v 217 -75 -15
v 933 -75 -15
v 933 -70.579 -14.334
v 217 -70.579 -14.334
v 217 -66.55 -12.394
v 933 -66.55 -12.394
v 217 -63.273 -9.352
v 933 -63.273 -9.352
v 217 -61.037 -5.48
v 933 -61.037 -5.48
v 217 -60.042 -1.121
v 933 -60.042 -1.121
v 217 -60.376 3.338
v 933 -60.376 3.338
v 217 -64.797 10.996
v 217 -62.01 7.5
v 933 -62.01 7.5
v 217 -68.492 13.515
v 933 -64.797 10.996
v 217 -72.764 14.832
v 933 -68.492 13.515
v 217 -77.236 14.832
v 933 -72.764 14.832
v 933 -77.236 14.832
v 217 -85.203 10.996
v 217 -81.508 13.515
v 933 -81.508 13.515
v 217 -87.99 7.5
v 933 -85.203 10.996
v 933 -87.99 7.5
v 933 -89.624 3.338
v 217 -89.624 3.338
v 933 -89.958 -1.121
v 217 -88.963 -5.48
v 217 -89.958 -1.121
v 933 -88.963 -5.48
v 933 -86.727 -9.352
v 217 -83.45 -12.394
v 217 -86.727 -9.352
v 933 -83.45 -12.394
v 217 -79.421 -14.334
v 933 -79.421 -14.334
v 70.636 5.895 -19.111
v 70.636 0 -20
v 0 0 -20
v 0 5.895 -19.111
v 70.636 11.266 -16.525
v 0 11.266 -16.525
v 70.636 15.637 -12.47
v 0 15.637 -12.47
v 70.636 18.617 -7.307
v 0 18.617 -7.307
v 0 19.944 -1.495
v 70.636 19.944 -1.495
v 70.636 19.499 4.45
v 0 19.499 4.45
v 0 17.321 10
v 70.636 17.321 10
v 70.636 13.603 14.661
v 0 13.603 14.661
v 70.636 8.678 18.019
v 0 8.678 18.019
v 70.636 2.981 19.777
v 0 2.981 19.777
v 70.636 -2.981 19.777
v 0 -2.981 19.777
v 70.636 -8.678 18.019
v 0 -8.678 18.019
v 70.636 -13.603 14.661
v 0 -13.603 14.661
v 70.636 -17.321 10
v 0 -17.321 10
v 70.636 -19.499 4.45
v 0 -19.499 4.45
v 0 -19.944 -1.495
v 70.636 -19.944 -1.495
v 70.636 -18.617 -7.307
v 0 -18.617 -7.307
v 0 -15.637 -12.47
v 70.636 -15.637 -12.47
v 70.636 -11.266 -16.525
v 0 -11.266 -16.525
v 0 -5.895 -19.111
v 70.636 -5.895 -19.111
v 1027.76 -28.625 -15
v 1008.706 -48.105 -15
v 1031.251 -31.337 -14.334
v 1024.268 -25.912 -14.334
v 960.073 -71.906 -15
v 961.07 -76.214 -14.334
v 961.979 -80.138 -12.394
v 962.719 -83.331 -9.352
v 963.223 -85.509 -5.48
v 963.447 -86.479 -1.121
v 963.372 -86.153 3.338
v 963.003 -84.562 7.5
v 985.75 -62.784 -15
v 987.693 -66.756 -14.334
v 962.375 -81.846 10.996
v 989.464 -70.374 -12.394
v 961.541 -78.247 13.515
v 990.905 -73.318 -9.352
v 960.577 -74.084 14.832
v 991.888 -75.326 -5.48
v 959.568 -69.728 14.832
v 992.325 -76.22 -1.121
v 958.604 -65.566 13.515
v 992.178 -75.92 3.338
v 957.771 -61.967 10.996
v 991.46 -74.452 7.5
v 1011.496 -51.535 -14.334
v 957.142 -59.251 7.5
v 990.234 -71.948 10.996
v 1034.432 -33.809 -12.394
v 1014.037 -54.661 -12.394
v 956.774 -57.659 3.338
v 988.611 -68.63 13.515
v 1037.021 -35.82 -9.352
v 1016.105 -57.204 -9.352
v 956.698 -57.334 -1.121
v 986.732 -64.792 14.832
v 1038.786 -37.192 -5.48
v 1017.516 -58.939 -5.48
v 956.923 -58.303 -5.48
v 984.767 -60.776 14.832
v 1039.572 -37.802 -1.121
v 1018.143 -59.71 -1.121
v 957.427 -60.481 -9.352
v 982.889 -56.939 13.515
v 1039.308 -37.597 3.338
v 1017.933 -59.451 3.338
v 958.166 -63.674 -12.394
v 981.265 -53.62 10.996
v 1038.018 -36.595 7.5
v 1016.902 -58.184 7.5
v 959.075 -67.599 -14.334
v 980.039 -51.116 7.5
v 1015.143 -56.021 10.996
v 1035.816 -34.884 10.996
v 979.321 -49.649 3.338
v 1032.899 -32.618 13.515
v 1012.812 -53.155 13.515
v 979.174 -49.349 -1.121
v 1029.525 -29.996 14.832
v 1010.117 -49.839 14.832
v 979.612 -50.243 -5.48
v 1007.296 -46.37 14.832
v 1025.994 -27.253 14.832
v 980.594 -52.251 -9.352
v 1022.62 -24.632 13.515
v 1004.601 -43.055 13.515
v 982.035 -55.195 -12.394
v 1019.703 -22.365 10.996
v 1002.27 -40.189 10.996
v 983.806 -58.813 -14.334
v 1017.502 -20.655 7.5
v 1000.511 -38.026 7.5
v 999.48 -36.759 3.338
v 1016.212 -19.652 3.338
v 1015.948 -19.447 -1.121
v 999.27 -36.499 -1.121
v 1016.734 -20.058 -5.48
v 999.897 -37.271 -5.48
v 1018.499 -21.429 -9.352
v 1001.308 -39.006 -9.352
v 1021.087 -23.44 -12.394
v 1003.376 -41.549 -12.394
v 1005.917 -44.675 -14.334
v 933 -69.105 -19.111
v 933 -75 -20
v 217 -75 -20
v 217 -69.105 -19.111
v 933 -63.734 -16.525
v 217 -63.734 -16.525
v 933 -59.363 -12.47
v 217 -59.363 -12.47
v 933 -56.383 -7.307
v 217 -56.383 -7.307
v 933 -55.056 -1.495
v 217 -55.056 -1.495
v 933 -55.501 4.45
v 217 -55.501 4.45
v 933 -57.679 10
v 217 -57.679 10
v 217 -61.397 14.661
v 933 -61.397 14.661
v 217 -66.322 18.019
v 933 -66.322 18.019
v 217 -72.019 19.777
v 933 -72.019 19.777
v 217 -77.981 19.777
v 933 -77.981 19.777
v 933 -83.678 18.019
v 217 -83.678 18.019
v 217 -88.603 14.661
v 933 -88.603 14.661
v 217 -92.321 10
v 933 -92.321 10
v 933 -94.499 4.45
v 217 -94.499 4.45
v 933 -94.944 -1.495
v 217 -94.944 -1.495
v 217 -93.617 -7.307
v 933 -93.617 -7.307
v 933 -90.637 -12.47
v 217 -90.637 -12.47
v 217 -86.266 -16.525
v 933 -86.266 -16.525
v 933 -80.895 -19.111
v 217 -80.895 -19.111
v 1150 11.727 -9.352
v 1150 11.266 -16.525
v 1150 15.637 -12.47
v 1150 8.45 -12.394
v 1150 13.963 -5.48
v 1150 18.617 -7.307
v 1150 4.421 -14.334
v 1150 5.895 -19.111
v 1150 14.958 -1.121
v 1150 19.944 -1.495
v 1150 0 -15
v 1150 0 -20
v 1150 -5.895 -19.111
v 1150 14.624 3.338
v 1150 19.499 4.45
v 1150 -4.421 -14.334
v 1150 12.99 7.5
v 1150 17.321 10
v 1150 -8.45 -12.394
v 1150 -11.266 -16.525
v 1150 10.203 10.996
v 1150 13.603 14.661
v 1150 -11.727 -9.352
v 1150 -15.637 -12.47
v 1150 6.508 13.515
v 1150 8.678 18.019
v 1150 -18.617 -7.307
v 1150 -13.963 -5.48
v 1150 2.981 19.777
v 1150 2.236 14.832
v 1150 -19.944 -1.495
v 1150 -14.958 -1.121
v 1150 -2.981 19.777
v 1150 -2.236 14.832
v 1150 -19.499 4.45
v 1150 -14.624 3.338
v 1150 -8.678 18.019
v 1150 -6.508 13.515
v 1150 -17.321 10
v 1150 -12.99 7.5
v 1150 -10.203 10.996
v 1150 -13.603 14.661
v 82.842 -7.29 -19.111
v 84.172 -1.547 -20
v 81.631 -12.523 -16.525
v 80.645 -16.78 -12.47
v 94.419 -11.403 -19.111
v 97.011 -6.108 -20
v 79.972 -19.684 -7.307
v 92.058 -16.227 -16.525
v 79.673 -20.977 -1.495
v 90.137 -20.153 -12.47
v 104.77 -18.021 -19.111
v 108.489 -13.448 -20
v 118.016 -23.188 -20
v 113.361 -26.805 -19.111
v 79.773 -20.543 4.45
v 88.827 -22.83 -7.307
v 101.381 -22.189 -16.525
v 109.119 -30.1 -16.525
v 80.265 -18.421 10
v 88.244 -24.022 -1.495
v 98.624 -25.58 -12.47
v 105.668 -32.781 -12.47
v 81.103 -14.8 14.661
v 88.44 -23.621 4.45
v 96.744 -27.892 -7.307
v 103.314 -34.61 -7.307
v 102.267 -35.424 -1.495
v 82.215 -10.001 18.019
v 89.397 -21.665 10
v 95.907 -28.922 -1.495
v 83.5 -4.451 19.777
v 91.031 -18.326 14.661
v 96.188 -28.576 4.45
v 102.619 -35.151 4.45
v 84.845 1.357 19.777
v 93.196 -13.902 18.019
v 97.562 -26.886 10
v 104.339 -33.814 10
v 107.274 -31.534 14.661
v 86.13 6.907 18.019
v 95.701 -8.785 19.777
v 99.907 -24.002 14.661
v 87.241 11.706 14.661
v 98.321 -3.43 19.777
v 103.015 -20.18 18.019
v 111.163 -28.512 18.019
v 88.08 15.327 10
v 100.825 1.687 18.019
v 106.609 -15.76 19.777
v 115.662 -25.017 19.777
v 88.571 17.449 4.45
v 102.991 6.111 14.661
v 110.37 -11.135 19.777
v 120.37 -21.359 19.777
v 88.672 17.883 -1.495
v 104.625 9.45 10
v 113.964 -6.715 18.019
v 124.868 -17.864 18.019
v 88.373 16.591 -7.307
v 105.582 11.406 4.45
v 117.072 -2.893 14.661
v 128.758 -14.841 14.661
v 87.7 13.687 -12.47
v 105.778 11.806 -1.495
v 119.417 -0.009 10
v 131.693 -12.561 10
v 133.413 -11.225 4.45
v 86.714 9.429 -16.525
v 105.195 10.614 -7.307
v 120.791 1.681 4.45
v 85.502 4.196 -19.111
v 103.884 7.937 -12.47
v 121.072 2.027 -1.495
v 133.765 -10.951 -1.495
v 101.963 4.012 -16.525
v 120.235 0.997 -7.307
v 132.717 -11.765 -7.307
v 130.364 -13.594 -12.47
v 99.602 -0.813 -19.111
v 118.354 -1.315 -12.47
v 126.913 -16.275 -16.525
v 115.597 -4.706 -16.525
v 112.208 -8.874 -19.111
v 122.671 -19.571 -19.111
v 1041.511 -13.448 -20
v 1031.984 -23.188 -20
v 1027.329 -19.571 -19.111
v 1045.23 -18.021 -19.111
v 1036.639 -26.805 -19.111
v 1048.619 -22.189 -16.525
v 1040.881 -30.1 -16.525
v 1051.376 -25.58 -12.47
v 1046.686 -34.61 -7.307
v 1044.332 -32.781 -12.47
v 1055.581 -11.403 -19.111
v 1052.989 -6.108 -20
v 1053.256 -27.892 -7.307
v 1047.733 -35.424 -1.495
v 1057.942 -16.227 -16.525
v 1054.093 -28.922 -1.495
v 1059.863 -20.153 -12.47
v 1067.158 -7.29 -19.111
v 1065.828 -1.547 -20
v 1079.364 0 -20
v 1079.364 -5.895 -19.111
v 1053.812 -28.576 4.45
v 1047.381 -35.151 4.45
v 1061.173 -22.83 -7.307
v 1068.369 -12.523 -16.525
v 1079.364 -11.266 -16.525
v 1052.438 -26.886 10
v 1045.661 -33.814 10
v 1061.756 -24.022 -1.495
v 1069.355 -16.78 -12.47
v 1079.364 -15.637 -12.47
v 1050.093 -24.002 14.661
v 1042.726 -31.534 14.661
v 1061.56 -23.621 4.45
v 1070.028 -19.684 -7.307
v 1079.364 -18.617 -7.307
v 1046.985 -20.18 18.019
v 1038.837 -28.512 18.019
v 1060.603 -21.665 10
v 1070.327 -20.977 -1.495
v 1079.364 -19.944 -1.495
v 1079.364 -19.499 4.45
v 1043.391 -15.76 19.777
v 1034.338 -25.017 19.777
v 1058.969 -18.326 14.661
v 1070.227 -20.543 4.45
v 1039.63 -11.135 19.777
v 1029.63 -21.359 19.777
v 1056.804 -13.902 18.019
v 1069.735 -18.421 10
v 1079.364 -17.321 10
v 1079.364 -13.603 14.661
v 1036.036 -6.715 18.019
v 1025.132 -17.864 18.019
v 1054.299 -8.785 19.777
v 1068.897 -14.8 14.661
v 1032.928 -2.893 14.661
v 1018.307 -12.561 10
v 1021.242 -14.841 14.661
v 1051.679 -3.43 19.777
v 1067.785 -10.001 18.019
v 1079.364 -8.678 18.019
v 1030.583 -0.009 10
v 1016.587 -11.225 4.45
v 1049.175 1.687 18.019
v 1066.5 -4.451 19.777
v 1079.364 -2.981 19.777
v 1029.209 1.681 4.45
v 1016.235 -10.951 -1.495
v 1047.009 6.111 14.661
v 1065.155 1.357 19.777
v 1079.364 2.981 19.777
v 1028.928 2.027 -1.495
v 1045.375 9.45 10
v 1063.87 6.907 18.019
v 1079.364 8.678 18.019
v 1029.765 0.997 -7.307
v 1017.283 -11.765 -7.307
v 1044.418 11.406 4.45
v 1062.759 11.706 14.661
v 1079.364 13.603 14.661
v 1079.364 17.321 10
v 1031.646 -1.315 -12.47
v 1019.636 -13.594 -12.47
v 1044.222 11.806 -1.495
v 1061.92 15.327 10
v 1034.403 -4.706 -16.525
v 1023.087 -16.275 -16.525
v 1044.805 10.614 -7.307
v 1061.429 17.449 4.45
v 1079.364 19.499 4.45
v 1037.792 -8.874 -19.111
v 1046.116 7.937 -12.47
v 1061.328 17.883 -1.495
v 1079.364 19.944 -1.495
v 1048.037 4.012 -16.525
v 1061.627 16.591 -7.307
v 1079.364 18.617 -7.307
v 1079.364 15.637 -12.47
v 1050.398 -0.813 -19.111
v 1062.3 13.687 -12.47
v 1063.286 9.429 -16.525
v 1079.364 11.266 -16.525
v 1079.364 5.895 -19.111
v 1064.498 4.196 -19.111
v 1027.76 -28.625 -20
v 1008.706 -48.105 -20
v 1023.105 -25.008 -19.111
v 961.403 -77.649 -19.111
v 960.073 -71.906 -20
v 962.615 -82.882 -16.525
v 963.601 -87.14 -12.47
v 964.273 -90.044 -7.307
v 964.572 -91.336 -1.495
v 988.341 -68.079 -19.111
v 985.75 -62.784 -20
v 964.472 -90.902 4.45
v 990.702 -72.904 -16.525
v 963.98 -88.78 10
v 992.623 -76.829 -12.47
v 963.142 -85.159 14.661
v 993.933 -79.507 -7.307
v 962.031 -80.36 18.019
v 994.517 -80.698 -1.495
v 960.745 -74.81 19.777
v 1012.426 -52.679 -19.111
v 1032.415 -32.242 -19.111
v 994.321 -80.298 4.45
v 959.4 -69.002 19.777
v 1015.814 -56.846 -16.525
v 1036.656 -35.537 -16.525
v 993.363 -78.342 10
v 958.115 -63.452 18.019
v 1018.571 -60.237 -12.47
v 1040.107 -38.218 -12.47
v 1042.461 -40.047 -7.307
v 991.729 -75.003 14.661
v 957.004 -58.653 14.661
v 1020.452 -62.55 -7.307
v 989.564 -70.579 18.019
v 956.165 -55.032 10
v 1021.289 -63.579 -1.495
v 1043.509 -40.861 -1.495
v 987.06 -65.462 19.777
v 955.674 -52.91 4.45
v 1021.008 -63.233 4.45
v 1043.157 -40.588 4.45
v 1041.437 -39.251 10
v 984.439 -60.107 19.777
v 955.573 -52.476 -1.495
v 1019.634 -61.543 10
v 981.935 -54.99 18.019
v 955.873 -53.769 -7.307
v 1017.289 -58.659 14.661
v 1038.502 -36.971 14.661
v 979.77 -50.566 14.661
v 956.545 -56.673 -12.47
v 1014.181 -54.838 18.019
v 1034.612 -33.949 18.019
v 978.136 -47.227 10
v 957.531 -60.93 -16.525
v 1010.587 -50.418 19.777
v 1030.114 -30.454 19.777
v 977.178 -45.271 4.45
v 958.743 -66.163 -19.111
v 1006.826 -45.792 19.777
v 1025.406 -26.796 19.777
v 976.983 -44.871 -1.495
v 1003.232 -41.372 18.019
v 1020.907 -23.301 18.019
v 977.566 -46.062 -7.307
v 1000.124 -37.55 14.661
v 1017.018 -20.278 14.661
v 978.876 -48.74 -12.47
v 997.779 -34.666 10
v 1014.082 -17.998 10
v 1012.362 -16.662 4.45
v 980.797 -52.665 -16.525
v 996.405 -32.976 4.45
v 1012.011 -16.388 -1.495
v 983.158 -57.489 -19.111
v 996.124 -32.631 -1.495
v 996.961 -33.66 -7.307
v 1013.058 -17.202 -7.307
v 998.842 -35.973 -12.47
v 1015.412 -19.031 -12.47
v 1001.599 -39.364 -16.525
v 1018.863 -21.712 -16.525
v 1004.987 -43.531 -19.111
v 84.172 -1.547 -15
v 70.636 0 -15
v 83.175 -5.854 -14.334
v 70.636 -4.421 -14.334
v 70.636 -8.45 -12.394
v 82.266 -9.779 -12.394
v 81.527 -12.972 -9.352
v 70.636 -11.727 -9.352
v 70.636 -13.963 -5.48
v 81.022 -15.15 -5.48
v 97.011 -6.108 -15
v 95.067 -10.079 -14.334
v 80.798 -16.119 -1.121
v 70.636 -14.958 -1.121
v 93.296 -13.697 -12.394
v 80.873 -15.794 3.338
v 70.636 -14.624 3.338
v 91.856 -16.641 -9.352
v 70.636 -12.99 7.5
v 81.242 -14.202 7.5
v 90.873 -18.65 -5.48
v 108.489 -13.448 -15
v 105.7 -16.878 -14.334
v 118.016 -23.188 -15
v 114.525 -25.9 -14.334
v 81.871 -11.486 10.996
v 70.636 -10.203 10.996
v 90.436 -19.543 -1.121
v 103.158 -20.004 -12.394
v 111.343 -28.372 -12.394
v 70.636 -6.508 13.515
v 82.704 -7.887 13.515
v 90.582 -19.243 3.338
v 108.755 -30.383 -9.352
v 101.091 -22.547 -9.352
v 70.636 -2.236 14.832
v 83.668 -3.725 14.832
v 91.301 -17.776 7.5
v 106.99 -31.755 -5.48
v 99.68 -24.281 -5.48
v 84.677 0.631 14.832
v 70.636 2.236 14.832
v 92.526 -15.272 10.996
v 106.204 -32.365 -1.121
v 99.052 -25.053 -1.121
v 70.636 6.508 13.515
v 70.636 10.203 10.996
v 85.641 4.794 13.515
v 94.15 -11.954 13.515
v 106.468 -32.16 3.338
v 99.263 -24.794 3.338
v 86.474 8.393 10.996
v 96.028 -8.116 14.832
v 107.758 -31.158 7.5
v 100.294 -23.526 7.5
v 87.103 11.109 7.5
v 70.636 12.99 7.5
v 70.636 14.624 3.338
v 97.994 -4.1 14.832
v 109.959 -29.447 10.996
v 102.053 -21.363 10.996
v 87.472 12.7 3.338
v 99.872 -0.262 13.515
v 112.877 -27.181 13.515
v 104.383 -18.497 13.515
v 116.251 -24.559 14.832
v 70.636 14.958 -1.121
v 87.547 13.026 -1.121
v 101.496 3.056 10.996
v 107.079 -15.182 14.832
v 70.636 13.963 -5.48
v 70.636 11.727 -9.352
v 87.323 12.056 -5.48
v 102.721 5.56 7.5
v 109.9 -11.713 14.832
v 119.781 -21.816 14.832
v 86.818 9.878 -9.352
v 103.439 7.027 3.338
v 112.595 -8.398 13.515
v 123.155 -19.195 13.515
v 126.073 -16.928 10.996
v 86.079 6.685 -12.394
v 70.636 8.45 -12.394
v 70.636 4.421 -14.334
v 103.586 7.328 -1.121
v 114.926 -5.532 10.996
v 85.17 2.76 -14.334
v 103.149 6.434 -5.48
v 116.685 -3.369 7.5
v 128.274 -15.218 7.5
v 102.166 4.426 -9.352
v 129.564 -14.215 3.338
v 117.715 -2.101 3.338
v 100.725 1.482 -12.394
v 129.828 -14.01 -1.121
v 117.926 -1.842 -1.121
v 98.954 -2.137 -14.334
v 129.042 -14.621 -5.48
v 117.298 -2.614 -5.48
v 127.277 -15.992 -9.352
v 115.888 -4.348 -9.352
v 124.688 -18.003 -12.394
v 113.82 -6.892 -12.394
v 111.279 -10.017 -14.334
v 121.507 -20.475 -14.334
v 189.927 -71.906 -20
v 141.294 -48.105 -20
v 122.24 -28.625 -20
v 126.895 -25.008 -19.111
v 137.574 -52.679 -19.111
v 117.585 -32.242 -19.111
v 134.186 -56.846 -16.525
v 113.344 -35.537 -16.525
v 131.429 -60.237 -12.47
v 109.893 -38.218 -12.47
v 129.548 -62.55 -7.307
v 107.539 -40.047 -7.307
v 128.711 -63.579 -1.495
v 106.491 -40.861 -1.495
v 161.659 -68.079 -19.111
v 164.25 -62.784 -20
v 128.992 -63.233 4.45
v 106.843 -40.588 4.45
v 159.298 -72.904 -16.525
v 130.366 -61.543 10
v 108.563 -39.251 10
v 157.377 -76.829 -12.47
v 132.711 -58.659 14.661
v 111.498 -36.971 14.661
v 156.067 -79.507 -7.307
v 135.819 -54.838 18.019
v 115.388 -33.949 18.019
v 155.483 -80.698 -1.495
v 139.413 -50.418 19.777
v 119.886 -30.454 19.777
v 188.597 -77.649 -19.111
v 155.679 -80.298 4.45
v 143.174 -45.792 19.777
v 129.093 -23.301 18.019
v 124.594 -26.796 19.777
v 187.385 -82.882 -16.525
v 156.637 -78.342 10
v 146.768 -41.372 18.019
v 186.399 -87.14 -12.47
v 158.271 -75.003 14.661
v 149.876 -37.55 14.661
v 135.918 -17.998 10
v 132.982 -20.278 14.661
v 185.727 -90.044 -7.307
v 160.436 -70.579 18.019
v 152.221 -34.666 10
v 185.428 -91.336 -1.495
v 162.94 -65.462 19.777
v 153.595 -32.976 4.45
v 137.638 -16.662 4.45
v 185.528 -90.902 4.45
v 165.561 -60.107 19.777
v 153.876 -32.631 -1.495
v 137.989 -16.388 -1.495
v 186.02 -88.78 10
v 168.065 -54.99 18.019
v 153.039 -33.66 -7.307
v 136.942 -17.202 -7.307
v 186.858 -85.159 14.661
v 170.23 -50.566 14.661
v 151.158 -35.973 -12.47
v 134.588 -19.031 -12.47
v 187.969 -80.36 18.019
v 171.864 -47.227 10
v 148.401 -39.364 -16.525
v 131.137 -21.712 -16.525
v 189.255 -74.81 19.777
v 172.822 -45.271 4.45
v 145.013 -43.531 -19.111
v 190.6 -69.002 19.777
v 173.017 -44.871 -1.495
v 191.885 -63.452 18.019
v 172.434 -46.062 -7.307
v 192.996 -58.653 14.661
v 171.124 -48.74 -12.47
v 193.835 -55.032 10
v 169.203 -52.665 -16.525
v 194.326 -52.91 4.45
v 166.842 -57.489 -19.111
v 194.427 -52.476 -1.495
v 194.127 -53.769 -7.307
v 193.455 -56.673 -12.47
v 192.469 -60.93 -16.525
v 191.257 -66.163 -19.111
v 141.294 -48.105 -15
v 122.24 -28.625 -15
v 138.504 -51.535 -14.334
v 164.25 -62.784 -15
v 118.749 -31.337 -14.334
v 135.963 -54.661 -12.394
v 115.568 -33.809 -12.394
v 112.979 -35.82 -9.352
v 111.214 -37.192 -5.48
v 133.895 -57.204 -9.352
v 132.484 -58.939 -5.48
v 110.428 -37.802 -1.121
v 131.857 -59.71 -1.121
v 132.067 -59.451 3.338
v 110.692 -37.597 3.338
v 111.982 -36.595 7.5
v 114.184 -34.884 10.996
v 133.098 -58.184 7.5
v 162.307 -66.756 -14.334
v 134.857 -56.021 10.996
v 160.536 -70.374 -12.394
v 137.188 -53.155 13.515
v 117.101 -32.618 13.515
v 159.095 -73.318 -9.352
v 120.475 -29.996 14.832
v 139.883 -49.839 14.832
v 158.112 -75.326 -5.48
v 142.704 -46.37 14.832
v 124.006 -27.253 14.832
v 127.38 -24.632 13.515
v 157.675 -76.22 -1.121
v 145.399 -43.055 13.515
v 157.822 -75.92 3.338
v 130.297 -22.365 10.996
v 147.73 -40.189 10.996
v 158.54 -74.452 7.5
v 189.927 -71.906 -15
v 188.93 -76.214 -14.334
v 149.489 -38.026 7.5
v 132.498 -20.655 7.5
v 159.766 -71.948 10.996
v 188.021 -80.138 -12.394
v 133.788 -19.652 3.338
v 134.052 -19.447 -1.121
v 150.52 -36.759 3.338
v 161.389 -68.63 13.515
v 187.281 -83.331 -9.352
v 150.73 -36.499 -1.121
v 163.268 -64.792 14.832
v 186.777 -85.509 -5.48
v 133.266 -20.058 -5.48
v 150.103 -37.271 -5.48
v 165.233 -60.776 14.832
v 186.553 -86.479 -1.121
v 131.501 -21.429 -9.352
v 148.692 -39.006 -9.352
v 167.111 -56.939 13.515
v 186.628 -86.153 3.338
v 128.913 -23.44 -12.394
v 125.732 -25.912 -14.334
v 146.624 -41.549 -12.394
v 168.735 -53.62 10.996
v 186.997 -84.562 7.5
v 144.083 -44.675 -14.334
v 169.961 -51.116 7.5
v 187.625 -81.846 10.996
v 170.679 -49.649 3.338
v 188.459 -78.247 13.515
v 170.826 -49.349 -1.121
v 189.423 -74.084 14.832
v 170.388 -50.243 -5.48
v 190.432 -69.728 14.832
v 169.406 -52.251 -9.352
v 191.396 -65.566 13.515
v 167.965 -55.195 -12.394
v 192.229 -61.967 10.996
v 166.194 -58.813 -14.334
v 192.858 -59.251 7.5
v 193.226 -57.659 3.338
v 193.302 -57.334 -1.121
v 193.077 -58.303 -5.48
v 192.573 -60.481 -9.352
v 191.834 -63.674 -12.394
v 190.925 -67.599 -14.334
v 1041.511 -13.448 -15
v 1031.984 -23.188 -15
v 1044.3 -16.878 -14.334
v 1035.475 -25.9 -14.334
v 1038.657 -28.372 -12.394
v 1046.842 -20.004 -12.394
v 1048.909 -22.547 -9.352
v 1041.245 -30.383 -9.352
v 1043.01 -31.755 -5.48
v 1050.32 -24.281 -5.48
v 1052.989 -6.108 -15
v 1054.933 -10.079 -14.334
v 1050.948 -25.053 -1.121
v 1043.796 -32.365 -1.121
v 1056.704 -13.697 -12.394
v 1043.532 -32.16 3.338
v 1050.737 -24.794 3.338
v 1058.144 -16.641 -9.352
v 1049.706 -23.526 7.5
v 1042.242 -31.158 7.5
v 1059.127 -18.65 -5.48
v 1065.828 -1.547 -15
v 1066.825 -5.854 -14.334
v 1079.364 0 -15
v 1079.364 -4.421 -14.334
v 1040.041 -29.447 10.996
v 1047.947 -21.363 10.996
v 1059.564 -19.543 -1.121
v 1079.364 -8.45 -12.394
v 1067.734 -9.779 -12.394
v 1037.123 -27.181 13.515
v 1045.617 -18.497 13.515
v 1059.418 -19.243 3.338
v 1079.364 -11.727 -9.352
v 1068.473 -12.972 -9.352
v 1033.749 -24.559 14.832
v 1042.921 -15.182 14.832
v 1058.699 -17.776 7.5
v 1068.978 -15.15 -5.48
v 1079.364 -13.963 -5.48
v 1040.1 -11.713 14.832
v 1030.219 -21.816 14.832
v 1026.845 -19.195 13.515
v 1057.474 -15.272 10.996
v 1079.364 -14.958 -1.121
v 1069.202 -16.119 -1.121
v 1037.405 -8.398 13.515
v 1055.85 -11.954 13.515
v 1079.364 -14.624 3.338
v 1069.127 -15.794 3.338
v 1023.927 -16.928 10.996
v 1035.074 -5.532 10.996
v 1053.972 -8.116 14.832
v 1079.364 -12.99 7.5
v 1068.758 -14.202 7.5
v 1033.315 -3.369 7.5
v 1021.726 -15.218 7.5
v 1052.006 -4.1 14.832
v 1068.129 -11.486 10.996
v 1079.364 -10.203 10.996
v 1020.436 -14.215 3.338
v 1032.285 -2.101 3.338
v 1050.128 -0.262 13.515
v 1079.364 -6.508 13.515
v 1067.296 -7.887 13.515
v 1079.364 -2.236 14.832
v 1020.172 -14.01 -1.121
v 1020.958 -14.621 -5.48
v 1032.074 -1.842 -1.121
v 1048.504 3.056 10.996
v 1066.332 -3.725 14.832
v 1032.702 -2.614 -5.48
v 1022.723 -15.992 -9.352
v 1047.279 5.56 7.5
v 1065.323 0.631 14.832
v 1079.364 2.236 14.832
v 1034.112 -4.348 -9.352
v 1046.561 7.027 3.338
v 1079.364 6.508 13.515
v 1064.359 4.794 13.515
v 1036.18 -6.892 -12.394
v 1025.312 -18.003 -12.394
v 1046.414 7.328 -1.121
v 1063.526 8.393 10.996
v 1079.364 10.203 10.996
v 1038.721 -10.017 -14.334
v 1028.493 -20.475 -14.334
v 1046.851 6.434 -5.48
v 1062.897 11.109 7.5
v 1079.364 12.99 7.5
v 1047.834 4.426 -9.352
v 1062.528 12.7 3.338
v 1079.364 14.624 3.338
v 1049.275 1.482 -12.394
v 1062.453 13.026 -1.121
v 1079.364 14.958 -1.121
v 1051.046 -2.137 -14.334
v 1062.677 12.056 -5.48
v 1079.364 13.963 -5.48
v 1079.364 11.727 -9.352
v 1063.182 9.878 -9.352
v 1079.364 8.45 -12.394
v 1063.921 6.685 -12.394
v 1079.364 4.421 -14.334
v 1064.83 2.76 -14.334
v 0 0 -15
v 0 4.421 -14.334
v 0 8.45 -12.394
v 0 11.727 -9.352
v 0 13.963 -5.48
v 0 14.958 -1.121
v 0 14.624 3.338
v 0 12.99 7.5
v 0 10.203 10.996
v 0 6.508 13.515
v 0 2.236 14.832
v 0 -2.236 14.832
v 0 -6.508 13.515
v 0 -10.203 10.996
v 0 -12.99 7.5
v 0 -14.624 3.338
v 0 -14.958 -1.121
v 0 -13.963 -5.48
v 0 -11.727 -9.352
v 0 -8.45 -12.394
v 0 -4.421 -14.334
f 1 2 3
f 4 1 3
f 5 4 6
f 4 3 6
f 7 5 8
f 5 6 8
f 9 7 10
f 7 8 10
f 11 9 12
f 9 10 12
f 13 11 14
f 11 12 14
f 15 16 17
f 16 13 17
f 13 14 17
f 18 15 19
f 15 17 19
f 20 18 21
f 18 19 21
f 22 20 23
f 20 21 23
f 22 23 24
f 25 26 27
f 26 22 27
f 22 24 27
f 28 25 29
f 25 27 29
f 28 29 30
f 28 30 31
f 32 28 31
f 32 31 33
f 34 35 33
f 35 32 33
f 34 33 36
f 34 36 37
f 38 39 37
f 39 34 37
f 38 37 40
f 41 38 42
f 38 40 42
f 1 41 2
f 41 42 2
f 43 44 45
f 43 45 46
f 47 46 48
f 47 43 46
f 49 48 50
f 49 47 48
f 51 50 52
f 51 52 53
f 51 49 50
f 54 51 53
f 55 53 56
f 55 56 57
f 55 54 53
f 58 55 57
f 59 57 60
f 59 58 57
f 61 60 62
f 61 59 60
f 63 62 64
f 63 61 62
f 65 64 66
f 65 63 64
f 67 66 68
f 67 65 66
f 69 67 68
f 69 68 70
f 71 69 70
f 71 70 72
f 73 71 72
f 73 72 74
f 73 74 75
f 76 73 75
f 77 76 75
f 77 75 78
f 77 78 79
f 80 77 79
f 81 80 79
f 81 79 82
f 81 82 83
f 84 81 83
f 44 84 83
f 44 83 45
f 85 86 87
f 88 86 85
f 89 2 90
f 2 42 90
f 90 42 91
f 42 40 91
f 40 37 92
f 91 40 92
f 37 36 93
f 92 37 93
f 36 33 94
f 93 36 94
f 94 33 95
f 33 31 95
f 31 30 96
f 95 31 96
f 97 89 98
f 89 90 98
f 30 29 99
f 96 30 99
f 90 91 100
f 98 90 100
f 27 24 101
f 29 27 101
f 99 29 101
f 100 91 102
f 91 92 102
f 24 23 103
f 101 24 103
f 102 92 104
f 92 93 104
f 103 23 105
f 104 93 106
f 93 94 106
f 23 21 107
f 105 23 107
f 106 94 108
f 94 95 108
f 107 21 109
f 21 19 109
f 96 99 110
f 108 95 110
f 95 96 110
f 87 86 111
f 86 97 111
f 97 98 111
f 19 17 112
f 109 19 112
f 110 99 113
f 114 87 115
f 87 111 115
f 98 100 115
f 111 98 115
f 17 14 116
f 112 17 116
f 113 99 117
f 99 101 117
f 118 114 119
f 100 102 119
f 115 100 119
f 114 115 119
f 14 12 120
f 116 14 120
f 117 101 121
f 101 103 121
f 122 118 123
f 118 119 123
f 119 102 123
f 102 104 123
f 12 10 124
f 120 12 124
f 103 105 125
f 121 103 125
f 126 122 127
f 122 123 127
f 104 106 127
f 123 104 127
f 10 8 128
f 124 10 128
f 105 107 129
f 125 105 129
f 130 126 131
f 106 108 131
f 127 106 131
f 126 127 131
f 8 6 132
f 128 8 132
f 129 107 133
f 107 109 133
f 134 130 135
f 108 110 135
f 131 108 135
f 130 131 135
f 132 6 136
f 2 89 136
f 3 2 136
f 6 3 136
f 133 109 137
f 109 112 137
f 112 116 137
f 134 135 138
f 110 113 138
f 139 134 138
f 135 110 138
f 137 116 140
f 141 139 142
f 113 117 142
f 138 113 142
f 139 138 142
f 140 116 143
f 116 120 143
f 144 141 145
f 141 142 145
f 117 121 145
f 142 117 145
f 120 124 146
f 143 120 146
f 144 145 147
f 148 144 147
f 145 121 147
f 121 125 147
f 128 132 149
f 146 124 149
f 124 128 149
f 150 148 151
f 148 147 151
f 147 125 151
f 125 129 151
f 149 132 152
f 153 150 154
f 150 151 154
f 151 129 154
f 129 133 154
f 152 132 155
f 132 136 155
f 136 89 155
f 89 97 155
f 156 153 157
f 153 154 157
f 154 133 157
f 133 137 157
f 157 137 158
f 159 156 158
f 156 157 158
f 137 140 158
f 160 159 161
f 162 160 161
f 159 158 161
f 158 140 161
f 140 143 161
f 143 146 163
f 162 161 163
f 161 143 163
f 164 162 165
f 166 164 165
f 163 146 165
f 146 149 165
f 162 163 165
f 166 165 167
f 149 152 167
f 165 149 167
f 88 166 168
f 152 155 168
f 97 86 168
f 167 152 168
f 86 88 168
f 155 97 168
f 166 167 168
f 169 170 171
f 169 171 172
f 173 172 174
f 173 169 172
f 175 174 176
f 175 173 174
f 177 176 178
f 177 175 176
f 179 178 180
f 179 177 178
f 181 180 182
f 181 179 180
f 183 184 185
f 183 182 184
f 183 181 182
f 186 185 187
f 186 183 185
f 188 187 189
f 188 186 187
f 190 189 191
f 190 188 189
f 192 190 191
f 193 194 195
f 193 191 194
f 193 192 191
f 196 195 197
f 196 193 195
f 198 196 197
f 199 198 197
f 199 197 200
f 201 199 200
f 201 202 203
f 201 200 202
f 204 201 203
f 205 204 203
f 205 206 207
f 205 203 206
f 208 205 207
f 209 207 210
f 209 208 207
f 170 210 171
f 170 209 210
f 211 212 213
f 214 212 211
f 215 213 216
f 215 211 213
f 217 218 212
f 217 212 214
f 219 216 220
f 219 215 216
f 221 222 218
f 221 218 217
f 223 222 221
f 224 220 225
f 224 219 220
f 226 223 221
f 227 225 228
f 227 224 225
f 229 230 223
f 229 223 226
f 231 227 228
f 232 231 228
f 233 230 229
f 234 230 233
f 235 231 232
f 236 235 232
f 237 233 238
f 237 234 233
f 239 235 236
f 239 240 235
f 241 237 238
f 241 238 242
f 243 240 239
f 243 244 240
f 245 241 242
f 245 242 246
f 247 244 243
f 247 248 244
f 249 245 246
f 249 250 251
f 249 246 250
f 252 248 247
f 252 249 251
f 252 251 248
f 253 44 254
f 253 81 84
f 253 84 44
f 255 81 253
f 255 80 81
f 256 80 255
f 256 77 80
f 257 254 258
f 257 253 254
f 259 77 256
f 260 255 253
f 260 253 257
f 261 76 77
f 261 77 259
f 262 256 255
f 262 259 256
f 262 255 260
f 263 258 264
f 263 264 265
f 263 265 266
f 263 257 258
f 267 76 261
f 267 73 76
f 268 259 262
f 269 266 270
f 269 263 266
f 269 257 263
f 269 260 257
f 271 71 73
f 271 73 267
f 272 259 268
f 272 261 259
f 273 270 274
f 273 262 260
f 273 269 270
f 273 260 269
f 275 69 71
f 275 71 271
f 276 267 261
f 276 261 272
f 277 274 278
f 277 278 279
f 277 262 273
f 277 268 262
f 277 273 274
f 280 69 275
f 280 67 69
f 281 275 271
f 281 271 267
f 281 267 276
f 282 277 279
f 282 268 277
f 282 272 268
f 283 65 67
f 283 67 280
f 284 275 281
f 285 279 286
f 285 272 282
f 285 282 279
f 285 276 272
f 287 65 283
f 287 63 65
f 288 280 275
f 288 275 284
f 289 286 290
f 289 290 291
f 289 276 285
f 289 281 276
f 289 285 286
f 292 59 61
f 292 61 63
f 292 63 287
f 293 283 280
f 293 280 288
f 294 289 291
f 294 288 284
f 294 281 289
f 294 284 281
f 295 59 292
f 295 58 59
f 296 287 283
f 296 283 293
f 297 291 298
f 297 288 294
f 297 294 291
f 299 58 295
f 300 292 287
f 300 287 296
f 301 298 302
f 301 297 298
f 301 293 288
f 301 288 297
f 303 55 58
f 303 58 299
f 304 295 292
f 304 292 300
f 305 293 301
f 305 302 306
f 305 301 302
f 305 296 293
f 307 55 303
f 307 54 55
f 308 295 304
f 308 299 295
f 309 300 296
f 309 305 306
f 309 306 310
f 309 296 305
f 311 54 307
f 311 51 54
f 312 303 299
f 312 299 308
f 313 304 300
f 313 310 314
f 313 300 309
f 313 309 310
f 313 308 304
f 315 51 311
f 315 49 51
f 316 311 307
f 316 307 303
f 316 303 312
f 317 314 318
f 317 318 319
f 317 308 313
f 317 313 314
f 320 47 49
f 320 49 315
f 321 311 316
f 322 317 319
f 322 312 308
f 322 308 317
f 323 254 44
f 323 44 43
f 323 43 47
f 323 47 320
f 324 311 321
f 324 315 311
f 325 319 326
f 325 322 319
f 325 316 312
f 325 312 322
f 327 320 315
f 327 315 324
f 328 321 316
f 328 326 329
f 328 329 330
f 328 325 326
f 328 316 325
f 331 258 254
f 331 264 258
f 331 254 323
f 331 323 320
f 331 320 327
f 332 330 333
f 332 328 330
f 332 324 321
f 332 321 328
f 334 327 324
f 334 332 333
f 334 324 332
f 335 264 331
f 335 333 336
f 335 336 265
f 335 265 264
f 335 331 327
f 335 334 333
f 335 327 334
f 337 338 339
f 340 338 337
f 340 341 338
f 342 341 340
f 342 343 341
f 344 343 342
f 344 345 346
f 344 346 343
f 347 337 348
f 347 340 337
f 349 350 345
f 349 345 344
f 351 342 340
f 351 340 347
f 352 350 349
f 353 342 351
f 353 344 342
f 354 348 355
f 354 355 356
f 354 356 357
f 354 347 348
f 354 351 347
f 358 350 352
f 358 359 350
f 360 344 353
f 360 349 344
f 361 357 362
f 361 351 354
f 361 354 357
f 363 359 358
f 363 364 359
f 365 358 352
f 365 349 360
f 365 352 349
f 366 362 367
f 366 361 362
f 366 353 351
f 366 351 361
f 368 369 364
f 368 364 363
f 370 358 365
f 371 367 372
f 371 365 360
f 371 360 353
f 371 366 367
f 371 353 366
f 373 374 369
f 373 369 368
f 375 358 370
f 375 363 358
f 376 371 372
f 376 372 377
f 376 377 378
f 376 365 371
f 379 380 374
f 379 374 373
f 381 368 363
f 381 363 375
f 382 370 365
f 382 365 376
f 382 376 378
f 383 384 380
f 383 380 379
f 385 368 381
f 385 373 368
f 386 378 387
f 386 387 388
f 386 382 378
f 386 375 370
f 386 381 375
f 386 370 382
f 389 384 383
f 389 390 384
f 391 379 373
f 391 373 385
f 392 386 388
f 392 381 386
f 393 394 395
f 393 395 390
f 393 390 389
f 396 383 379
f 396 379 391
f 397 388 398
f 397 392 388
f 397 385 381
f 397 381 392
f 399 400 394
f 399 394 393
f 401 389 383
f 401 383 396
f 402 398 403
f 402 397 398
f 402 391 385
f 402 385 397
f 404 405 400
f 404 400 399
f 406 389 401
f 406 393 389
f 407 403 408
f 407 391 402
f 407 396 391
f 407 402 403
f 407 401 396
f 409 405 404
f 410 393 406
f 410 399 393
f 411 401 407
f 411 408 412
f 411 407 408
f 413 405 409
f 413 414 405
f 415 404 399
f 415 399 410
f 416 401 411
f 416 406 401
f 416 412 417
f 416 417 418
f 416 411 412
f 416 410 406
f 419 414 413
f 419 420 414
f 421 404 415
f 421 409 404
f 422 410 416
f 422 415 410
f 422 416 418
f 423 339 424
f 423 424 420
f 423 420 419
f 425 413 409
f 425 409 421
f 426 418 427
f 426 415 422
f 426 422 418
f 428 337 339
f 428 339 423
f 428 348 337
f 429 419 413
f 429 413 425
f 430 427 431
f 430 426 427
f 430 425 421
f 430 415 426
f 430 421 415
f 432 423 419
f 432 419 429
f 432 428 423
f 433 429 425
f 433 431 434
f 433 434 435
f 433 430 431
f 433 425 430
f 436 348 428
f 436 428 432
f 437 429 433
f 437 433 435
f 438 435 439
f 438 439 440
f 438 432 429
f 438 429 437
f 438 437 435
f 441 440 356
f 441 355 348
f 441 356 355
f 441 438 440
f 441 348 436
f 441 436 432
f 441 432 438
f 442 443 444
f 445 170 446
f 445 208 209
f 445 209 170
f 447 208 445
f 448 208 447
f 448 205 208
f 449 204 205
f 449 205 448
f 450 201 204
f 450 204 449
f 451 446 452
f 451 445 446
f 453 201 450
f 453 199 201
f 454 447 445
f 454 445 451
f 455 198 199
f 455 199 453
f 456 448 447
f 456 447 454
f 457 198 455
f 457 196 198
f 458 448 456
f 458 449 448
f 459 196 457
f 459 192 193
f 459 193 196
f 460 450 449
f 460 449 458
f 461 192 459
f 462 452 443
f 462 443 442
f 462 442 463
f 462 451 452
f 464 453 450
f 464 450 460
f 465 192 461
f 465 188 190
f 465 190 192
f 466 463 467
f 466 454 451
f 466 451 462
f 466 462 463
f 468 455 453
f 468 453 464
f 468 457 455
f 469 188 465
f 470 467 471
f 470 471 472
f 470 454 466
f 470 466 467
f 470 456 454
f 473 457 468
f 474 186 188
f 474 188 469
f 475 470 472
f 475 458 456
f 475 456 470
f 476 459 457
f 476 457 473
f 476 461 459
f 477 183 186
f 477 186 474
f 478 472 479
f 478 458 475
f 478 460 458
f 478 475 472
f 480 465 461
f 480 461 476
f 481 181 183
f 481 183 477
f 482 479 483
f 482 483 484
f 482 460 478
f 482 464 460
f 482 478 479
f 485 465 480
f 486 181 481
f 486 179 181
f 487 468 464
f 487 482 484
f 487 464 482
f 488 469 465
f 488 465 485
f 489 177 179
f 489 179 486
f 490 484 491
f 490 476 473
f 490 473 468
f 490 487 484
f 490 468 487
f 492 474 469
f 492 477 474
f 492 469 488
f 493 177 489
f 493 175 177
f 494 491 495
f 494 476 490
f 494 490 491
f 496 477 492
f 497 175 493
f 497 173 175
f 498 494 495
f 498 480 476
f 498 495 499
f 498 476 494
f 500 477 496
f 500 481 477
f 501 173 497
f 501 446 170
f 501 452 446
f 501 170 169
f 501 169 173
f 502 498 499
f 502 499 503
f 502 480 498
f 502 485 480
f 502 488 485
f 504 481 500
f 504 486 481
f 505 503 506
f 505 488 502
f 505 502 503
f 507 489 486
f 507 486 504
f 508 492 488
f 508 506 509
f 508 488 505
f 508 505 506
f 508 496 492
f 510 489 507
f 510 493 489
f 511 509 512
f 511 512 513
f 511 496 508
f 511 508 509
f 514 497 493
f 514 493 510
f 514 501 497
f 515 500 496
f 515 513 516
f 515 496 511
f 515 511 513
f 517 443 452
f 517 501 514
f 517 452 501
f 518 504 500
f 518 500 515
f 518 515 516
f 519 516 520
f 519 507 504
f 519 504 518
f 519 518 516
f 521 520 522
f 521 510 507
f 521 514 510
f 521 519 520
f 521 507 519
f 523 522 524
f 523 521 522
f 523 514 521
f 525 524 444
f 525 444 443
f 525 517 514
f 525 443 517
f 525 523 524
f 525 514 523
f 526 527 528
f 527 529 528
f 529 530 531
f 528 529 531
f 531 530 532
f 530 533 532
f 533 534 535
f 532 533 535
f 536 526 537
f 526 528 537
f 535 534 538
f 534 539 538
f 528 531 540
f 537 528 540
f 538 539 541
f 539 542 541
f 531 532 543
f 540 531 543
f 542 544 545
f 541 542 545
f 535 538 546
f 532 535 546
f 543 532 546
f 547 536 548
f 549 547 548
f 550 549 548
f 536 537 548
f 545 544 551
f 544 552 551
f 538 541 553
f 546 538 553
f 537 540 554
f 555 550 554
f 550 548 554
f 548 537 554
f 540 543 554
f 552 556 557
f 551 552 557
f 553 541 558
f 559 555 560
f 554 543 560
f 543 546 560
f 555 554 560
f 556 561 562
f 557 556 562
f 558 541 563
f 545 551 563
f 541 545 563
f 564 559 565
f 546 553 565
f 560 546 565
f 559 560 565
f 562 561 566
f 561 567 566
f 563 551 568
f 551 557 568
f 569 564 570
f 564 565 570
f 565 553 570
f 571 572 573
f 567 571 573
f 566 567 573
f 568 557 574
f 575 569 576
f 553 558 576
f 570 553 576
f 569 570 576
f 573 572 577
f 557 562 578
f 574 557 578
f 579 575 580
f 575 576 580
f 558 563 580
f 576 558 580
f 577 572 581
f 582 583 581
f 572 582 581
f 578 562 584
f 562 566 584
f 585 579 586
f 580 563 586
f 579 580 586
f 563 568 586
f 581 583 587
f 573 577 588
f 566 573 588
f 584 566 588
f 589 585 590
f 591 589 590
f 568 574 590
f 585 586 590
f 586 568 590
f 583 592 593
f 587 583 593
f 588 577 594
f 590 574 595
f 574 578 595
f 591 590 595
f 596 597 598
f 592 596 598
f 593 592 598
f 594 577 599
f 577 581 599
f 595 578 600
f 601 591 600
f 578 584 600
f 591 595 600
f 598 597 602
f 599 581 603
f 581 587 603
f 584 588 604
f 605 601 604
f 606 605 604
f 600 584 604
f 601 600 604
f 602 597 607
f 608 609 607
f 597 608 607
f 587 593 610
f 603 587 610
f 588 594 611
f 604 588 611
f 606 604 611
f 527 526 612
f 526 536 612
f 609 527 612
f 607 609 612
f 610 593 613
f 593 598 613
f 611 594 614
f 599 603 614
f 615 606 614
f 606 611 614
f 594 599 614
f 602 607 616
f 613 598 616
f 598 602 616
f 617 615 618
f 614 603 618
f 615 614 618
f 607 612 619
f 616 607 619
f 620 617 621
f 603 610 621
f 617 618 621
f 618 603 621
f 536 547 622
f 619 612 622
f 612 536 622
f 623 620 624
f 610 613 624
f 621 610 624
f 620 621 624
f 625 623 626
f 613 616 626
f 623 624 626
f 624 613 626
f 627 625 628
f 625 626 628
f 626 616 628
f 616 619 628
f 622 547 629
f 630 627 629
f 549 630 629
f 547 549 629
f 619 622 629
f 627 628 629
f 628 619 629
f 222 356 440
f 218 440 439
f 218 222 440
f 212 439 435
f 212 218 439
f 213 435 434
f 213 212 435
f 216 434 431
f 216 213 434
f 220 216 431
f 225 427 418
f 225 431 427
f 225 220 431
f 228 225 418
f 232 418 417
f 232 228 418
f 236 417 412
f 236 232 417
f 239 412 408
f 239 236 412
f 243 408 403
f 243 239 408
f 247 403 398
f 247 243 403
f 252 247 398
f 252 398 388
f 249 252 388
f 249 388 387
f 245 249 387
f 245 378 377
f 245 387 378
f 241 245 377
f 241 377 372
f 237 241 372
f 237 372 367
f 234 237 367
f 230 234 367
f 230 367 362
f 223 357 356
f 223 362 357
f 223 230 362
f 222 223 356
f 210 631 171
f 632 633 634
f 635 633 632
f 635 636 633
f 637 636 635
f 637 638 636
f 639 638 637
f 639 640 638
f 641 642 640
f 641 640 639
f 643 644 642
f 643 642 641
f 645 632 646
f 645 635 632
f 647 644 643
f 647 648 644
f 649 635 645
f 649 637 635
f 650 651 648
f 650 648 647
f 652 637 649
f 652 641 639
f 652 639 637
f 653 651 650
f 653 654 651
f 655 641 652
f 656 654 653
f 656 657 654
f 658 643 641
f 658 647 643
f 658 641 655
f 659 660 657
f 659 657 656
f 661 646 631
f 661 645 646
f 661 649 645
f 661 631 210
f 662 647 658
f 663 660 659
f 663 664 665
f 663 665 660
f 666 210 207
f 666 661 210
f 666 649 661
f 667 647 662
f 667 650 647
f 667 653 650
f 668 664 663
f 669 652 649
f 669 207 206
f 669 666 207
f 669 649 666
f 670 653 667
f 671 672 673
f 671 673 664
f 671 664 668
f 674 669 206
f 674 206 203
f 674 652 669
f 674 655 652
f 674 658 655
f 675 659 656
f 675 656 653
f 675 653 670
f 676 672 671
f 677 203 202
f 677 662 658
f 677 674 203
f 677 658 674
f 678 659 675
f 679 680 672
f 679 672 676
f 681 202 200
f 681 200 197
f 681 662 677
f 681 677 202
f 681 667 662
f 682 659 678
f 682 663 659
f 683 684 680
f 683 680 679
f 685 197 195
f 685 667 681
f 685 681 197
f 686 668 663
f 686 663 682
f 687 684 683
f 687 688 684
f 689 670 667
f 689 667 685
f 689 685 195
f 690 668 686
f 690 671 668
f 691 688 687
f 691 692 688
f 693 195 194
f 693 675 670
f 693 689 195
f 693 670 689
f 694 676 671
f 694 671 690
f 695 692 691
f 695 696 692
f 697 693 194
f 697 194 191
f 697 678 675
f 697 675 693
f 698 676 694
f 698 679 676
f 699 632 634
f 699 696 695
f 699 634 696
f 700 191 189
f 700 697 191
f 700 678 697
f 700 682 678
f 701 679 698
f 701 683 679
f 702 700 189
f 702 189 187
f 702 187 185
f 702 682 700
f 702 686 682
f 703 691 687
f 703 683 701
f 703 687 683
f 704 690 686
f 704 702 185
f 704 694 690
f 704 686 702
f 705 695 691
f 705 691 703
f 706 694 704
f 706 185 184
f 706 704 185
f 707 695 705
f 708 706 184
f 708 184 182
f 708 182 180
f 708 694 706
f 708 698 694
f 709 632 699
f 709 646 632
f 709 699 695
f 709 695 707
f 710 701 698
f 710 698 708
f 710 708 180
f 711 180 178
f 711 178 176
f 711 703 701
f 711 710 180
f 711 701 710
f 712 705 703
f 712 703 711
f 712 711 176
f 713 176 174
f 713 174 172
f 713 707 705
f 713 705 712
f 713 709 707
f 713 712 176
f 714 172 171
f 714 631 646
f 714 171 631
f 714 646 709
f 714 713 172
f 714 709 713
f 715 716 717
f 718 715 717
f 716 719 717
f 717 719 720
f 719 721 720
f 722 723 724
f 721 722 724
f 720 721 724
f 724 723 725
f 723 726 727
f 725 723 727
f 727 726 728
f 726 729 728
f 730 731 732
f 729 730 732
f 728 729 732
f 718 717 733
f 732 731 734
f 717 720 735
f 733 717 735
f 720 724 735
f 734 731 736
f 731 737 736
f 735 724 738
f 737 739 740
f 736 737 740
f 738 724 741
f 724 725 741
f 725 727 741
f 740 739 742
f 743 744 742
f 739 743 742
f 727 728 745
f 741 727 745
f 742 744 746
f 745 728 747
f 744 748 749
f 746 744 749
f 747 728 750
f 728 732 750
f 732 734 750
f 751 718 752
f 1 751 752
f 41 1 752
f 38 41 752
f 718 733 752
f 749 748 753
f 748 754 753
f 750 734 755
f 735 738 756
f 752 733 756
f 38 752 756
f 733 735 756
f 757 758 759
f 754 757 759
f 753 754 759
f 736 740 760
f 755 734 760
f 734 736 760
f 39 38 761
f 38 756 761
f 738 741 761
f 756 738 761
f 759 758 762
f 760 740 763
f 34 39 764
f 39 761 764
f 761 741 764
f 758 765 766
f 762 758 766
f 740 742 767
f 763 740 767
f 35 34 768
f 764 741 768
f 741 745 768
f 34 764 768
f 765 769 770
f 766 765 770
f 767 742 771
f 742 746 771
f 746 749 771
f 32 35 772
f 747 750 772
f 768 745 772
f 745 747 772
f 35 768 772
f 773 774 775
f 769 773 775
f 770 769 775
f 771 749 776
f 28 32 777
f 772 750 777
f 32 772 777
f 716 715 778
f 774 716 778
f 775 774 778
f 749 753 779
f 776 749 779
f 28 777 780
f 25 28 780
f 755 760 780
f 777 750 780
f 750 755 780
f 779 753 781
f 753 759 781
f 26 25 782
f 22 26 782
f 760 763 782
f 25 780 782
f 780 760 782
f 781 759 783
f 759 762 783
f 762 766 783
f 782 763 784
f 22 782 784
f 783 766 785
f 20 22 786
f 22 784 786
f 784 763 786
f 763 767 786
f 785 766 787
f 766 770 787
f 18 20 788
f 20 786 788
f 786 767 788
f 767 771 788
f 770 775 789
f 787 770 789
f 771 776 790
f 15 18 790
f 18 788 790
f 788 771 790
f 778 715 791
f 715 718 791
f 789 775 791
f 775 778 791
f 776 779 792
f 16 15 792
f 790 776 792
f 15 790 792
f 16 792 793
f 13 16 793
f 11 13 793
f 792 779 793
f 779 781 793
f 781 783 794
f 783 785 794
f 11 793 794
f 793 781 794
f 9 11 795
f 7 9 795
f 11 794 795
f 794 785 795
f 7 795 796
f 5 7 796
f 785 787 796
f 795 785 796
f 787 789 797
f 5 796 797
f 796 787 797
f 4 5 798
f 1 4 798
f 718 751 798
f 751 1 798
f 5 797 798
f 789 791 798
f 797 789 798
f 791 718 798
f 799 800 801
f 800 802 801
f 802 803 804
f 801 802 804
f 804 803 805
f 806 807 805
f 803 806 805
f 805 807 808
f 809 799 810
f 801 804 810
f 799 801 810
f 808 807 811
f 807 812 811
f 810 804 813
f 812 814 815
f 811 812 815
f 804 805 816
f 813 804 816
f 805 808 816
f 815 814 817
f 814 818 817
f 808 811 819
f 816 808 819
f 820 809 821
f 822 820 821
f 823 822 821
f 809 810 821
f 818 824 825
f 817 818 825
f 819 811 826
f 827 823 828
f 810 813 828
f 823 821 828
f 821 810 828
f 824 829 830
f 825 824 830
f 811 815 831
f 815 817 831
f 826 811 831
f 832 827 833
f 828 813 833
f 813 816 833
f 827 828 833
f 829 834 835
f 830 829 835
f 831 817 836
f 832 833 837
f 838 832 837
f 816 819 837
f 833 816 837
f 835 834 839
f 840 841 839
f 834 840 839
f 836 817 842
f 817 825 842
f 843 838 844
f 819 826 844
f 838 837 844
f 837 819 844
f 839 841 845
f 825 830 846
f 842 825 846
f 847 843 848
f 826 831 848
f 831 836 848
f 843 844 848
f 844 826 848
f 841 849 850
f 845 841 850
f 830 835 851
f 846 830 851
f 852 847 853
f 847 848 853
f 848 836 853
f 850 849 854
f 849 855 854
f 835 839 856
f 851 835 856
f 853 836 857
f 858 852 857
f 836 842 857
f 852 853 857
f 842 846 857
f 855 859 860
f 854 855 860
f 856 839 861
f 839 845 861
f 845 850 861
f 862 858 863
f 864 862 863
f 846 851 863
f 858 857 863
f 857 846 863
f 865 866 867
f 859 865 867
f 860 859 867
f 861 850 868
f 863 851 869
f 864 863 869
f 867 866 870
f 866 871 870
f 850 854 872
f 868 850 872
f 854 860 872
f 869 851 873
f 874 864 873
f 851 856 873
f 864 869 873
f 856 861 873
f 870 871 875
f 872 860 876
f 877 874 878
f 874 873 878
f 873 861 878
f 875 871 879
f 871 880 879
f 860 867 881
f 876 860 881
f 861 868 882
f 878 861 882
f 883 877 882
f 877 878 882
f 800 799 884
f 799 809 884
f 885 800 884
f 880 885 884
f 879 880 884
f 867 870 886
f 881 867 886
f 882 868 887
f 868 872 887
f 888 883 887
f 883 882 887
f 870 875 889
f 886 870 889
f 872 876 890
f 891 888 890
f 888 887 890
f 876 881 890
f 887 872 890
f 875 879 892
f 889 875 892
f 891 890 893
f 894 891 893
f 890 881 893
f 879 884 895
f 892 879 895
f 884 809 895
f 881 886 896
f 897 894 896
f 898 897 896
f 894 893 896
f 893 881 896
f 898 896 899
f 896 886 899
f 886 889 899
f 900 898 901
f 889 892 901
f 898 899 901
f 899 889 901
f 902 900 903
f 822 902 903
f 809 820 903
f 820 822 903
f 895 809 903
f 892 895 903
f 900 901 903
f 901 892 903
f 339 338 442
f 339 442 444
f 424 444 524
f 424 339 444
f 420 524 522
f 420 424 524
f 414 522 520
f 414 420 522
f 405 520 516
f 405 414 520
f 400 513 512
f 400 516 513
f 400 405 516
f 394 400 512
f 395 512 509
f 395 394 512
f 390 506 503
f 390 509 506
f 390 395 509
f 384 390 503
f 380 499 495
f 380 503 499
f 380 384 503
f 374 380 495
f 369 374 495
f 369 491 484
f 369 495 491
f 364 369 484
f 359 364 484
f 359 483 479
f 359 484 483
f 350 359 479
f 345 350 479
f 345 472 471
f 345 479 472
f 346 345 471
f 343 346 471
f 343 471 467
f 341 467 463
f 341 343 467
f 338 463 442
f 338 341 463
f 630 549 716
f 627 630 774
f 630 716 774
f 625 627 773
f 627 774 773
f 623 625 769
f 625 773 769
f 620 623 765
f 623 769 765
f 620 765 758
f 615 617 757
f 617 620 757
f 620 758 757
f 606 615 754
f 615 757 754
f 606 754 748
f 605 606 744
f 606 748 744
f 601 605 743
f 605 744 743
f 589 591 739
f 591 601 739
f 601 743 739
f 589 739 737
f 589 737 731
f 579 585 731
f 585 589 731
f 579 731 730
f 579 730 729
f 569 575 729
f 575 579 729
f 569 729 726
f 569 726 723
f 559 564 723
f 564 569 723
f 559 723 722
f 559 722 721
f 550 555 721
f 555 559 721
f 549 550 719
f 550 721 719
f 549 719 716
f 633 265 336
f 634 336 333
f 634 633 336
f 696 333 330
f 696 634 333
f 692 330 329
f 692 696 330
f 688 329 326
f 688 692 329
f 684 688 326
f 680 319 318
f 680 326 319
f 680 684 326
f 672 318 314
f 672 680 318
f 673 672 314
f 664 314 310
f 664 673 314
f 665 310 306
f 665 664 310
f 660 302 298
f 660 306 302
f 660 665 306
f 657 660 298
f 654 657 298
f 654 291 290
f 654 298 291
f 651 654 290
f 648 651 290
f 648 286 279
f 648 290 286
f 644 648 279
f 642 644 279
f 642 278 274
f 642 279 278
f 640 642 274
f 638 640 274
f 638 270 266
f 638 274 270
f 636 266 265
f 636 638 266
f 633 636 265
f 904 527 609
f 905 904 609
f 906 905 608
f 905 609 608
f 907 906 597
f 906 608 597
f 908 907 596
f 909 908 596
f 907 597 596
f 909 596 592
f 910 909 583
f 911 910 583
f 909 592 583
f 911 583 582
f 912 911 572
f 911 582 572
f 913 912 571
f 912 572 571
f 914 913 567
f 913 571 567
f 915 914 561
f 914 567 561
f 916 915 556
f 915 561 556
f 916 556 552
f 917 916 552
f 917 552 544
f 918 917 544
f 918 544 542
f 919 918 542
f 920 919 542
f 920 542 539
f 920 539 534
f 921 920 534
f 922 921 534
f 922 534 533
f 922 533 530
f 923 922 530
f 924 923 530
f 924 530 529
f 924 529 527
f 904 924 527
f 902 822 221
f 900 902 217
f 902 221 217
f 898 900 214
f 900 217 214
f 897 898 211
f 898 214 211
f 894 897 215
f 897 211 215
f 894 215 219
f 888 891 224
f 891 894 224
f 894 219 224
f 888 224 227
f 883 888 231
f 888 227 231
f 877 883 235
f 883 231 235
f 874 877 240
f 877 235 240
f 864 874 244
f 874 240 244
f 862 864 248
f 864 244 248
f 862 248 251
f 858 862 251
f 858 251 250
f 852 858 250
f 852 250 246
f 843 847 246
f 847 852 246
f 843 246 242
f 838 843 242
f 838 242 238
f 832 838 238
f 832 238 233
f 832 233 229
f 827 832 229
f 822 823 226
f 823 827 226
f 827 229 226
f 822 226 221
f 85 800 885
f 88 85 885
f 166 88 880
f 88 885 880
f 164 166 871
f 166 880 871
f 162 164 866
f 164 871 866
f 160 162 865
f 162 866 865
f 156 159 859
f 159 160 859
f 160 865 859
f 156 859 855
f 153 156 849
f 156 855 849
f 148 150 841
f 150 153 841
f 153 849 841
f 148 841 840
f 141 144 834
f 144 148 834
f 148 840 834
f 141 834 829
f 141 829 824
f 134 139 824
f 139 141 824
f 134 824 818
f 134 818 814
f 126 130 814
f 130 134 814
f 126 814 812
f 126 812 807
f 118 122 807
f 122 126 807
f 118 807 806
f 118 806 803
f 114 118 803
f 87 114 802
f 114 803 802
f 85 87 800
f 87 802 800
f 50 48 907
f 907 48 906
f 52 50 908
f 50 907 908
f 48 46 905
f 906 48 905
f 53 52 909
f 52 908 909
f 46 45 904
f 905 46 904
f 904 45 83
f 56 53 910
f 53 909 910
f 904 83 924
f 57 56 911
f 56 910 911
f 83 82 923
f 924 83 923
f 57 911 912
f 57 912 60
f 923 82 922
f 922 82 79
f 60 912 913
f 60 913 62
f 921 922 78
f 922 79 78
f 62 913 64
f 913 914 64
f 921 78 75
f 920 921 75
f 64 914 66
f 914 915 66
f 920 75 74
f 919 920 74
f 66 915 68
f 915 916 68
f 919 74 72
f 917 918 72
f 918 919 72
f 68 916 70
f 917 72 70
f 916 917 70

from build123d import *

# Parameters (mm, degrees)
SKETCH3_R   = 20
SKETCH3_R_2 = 15


with BuildPart() as part:
    # Sweep1: sweep along a path in Sketch2
    with BuildLine(Plane.XY) as sweep1_path:
        Line((0, 0), (70.636050153, 0))
        ThreePointArc((70.636050153, 0), (97.010850822, -6.107793795), (118.015923362, -23.187670345))
        Line((118.015923362, -23.187670345), (122.240253581, -28.624659311))
        ThreePointArc((122.240253581, -28.624659311), (164.250398662, -62.78441241), (217, -75))
        Line((217, -75), (933, -75))
        ThreePointArc((933, -75), (985.749601338, -62.78441241), (1027.759746419, -28.624659311))
        Line((1027.759746419, -28.624659311), (1031.984076638, -23.187670345))
        ThreePointArc((1031.984076638, -23.187670345), (1052.989149178, -6.107793795), (1079.363949847, 0))
        Line((1079.363949847, 0), (1150, 0))
    # Sketch3 → Sweep1 (sweep)
    with BuildSketch(Plane(origin=(0, 0, 0), x_dir=(0, 0, -1), z_dir=(1, 0, 0))):
        Circle(SKETCH3_R)
        Circle(SKETCH3_R_2, mode=Mode.SUBTRACT)
    sweep(path=sweep1_path.line)


solid = part.part
